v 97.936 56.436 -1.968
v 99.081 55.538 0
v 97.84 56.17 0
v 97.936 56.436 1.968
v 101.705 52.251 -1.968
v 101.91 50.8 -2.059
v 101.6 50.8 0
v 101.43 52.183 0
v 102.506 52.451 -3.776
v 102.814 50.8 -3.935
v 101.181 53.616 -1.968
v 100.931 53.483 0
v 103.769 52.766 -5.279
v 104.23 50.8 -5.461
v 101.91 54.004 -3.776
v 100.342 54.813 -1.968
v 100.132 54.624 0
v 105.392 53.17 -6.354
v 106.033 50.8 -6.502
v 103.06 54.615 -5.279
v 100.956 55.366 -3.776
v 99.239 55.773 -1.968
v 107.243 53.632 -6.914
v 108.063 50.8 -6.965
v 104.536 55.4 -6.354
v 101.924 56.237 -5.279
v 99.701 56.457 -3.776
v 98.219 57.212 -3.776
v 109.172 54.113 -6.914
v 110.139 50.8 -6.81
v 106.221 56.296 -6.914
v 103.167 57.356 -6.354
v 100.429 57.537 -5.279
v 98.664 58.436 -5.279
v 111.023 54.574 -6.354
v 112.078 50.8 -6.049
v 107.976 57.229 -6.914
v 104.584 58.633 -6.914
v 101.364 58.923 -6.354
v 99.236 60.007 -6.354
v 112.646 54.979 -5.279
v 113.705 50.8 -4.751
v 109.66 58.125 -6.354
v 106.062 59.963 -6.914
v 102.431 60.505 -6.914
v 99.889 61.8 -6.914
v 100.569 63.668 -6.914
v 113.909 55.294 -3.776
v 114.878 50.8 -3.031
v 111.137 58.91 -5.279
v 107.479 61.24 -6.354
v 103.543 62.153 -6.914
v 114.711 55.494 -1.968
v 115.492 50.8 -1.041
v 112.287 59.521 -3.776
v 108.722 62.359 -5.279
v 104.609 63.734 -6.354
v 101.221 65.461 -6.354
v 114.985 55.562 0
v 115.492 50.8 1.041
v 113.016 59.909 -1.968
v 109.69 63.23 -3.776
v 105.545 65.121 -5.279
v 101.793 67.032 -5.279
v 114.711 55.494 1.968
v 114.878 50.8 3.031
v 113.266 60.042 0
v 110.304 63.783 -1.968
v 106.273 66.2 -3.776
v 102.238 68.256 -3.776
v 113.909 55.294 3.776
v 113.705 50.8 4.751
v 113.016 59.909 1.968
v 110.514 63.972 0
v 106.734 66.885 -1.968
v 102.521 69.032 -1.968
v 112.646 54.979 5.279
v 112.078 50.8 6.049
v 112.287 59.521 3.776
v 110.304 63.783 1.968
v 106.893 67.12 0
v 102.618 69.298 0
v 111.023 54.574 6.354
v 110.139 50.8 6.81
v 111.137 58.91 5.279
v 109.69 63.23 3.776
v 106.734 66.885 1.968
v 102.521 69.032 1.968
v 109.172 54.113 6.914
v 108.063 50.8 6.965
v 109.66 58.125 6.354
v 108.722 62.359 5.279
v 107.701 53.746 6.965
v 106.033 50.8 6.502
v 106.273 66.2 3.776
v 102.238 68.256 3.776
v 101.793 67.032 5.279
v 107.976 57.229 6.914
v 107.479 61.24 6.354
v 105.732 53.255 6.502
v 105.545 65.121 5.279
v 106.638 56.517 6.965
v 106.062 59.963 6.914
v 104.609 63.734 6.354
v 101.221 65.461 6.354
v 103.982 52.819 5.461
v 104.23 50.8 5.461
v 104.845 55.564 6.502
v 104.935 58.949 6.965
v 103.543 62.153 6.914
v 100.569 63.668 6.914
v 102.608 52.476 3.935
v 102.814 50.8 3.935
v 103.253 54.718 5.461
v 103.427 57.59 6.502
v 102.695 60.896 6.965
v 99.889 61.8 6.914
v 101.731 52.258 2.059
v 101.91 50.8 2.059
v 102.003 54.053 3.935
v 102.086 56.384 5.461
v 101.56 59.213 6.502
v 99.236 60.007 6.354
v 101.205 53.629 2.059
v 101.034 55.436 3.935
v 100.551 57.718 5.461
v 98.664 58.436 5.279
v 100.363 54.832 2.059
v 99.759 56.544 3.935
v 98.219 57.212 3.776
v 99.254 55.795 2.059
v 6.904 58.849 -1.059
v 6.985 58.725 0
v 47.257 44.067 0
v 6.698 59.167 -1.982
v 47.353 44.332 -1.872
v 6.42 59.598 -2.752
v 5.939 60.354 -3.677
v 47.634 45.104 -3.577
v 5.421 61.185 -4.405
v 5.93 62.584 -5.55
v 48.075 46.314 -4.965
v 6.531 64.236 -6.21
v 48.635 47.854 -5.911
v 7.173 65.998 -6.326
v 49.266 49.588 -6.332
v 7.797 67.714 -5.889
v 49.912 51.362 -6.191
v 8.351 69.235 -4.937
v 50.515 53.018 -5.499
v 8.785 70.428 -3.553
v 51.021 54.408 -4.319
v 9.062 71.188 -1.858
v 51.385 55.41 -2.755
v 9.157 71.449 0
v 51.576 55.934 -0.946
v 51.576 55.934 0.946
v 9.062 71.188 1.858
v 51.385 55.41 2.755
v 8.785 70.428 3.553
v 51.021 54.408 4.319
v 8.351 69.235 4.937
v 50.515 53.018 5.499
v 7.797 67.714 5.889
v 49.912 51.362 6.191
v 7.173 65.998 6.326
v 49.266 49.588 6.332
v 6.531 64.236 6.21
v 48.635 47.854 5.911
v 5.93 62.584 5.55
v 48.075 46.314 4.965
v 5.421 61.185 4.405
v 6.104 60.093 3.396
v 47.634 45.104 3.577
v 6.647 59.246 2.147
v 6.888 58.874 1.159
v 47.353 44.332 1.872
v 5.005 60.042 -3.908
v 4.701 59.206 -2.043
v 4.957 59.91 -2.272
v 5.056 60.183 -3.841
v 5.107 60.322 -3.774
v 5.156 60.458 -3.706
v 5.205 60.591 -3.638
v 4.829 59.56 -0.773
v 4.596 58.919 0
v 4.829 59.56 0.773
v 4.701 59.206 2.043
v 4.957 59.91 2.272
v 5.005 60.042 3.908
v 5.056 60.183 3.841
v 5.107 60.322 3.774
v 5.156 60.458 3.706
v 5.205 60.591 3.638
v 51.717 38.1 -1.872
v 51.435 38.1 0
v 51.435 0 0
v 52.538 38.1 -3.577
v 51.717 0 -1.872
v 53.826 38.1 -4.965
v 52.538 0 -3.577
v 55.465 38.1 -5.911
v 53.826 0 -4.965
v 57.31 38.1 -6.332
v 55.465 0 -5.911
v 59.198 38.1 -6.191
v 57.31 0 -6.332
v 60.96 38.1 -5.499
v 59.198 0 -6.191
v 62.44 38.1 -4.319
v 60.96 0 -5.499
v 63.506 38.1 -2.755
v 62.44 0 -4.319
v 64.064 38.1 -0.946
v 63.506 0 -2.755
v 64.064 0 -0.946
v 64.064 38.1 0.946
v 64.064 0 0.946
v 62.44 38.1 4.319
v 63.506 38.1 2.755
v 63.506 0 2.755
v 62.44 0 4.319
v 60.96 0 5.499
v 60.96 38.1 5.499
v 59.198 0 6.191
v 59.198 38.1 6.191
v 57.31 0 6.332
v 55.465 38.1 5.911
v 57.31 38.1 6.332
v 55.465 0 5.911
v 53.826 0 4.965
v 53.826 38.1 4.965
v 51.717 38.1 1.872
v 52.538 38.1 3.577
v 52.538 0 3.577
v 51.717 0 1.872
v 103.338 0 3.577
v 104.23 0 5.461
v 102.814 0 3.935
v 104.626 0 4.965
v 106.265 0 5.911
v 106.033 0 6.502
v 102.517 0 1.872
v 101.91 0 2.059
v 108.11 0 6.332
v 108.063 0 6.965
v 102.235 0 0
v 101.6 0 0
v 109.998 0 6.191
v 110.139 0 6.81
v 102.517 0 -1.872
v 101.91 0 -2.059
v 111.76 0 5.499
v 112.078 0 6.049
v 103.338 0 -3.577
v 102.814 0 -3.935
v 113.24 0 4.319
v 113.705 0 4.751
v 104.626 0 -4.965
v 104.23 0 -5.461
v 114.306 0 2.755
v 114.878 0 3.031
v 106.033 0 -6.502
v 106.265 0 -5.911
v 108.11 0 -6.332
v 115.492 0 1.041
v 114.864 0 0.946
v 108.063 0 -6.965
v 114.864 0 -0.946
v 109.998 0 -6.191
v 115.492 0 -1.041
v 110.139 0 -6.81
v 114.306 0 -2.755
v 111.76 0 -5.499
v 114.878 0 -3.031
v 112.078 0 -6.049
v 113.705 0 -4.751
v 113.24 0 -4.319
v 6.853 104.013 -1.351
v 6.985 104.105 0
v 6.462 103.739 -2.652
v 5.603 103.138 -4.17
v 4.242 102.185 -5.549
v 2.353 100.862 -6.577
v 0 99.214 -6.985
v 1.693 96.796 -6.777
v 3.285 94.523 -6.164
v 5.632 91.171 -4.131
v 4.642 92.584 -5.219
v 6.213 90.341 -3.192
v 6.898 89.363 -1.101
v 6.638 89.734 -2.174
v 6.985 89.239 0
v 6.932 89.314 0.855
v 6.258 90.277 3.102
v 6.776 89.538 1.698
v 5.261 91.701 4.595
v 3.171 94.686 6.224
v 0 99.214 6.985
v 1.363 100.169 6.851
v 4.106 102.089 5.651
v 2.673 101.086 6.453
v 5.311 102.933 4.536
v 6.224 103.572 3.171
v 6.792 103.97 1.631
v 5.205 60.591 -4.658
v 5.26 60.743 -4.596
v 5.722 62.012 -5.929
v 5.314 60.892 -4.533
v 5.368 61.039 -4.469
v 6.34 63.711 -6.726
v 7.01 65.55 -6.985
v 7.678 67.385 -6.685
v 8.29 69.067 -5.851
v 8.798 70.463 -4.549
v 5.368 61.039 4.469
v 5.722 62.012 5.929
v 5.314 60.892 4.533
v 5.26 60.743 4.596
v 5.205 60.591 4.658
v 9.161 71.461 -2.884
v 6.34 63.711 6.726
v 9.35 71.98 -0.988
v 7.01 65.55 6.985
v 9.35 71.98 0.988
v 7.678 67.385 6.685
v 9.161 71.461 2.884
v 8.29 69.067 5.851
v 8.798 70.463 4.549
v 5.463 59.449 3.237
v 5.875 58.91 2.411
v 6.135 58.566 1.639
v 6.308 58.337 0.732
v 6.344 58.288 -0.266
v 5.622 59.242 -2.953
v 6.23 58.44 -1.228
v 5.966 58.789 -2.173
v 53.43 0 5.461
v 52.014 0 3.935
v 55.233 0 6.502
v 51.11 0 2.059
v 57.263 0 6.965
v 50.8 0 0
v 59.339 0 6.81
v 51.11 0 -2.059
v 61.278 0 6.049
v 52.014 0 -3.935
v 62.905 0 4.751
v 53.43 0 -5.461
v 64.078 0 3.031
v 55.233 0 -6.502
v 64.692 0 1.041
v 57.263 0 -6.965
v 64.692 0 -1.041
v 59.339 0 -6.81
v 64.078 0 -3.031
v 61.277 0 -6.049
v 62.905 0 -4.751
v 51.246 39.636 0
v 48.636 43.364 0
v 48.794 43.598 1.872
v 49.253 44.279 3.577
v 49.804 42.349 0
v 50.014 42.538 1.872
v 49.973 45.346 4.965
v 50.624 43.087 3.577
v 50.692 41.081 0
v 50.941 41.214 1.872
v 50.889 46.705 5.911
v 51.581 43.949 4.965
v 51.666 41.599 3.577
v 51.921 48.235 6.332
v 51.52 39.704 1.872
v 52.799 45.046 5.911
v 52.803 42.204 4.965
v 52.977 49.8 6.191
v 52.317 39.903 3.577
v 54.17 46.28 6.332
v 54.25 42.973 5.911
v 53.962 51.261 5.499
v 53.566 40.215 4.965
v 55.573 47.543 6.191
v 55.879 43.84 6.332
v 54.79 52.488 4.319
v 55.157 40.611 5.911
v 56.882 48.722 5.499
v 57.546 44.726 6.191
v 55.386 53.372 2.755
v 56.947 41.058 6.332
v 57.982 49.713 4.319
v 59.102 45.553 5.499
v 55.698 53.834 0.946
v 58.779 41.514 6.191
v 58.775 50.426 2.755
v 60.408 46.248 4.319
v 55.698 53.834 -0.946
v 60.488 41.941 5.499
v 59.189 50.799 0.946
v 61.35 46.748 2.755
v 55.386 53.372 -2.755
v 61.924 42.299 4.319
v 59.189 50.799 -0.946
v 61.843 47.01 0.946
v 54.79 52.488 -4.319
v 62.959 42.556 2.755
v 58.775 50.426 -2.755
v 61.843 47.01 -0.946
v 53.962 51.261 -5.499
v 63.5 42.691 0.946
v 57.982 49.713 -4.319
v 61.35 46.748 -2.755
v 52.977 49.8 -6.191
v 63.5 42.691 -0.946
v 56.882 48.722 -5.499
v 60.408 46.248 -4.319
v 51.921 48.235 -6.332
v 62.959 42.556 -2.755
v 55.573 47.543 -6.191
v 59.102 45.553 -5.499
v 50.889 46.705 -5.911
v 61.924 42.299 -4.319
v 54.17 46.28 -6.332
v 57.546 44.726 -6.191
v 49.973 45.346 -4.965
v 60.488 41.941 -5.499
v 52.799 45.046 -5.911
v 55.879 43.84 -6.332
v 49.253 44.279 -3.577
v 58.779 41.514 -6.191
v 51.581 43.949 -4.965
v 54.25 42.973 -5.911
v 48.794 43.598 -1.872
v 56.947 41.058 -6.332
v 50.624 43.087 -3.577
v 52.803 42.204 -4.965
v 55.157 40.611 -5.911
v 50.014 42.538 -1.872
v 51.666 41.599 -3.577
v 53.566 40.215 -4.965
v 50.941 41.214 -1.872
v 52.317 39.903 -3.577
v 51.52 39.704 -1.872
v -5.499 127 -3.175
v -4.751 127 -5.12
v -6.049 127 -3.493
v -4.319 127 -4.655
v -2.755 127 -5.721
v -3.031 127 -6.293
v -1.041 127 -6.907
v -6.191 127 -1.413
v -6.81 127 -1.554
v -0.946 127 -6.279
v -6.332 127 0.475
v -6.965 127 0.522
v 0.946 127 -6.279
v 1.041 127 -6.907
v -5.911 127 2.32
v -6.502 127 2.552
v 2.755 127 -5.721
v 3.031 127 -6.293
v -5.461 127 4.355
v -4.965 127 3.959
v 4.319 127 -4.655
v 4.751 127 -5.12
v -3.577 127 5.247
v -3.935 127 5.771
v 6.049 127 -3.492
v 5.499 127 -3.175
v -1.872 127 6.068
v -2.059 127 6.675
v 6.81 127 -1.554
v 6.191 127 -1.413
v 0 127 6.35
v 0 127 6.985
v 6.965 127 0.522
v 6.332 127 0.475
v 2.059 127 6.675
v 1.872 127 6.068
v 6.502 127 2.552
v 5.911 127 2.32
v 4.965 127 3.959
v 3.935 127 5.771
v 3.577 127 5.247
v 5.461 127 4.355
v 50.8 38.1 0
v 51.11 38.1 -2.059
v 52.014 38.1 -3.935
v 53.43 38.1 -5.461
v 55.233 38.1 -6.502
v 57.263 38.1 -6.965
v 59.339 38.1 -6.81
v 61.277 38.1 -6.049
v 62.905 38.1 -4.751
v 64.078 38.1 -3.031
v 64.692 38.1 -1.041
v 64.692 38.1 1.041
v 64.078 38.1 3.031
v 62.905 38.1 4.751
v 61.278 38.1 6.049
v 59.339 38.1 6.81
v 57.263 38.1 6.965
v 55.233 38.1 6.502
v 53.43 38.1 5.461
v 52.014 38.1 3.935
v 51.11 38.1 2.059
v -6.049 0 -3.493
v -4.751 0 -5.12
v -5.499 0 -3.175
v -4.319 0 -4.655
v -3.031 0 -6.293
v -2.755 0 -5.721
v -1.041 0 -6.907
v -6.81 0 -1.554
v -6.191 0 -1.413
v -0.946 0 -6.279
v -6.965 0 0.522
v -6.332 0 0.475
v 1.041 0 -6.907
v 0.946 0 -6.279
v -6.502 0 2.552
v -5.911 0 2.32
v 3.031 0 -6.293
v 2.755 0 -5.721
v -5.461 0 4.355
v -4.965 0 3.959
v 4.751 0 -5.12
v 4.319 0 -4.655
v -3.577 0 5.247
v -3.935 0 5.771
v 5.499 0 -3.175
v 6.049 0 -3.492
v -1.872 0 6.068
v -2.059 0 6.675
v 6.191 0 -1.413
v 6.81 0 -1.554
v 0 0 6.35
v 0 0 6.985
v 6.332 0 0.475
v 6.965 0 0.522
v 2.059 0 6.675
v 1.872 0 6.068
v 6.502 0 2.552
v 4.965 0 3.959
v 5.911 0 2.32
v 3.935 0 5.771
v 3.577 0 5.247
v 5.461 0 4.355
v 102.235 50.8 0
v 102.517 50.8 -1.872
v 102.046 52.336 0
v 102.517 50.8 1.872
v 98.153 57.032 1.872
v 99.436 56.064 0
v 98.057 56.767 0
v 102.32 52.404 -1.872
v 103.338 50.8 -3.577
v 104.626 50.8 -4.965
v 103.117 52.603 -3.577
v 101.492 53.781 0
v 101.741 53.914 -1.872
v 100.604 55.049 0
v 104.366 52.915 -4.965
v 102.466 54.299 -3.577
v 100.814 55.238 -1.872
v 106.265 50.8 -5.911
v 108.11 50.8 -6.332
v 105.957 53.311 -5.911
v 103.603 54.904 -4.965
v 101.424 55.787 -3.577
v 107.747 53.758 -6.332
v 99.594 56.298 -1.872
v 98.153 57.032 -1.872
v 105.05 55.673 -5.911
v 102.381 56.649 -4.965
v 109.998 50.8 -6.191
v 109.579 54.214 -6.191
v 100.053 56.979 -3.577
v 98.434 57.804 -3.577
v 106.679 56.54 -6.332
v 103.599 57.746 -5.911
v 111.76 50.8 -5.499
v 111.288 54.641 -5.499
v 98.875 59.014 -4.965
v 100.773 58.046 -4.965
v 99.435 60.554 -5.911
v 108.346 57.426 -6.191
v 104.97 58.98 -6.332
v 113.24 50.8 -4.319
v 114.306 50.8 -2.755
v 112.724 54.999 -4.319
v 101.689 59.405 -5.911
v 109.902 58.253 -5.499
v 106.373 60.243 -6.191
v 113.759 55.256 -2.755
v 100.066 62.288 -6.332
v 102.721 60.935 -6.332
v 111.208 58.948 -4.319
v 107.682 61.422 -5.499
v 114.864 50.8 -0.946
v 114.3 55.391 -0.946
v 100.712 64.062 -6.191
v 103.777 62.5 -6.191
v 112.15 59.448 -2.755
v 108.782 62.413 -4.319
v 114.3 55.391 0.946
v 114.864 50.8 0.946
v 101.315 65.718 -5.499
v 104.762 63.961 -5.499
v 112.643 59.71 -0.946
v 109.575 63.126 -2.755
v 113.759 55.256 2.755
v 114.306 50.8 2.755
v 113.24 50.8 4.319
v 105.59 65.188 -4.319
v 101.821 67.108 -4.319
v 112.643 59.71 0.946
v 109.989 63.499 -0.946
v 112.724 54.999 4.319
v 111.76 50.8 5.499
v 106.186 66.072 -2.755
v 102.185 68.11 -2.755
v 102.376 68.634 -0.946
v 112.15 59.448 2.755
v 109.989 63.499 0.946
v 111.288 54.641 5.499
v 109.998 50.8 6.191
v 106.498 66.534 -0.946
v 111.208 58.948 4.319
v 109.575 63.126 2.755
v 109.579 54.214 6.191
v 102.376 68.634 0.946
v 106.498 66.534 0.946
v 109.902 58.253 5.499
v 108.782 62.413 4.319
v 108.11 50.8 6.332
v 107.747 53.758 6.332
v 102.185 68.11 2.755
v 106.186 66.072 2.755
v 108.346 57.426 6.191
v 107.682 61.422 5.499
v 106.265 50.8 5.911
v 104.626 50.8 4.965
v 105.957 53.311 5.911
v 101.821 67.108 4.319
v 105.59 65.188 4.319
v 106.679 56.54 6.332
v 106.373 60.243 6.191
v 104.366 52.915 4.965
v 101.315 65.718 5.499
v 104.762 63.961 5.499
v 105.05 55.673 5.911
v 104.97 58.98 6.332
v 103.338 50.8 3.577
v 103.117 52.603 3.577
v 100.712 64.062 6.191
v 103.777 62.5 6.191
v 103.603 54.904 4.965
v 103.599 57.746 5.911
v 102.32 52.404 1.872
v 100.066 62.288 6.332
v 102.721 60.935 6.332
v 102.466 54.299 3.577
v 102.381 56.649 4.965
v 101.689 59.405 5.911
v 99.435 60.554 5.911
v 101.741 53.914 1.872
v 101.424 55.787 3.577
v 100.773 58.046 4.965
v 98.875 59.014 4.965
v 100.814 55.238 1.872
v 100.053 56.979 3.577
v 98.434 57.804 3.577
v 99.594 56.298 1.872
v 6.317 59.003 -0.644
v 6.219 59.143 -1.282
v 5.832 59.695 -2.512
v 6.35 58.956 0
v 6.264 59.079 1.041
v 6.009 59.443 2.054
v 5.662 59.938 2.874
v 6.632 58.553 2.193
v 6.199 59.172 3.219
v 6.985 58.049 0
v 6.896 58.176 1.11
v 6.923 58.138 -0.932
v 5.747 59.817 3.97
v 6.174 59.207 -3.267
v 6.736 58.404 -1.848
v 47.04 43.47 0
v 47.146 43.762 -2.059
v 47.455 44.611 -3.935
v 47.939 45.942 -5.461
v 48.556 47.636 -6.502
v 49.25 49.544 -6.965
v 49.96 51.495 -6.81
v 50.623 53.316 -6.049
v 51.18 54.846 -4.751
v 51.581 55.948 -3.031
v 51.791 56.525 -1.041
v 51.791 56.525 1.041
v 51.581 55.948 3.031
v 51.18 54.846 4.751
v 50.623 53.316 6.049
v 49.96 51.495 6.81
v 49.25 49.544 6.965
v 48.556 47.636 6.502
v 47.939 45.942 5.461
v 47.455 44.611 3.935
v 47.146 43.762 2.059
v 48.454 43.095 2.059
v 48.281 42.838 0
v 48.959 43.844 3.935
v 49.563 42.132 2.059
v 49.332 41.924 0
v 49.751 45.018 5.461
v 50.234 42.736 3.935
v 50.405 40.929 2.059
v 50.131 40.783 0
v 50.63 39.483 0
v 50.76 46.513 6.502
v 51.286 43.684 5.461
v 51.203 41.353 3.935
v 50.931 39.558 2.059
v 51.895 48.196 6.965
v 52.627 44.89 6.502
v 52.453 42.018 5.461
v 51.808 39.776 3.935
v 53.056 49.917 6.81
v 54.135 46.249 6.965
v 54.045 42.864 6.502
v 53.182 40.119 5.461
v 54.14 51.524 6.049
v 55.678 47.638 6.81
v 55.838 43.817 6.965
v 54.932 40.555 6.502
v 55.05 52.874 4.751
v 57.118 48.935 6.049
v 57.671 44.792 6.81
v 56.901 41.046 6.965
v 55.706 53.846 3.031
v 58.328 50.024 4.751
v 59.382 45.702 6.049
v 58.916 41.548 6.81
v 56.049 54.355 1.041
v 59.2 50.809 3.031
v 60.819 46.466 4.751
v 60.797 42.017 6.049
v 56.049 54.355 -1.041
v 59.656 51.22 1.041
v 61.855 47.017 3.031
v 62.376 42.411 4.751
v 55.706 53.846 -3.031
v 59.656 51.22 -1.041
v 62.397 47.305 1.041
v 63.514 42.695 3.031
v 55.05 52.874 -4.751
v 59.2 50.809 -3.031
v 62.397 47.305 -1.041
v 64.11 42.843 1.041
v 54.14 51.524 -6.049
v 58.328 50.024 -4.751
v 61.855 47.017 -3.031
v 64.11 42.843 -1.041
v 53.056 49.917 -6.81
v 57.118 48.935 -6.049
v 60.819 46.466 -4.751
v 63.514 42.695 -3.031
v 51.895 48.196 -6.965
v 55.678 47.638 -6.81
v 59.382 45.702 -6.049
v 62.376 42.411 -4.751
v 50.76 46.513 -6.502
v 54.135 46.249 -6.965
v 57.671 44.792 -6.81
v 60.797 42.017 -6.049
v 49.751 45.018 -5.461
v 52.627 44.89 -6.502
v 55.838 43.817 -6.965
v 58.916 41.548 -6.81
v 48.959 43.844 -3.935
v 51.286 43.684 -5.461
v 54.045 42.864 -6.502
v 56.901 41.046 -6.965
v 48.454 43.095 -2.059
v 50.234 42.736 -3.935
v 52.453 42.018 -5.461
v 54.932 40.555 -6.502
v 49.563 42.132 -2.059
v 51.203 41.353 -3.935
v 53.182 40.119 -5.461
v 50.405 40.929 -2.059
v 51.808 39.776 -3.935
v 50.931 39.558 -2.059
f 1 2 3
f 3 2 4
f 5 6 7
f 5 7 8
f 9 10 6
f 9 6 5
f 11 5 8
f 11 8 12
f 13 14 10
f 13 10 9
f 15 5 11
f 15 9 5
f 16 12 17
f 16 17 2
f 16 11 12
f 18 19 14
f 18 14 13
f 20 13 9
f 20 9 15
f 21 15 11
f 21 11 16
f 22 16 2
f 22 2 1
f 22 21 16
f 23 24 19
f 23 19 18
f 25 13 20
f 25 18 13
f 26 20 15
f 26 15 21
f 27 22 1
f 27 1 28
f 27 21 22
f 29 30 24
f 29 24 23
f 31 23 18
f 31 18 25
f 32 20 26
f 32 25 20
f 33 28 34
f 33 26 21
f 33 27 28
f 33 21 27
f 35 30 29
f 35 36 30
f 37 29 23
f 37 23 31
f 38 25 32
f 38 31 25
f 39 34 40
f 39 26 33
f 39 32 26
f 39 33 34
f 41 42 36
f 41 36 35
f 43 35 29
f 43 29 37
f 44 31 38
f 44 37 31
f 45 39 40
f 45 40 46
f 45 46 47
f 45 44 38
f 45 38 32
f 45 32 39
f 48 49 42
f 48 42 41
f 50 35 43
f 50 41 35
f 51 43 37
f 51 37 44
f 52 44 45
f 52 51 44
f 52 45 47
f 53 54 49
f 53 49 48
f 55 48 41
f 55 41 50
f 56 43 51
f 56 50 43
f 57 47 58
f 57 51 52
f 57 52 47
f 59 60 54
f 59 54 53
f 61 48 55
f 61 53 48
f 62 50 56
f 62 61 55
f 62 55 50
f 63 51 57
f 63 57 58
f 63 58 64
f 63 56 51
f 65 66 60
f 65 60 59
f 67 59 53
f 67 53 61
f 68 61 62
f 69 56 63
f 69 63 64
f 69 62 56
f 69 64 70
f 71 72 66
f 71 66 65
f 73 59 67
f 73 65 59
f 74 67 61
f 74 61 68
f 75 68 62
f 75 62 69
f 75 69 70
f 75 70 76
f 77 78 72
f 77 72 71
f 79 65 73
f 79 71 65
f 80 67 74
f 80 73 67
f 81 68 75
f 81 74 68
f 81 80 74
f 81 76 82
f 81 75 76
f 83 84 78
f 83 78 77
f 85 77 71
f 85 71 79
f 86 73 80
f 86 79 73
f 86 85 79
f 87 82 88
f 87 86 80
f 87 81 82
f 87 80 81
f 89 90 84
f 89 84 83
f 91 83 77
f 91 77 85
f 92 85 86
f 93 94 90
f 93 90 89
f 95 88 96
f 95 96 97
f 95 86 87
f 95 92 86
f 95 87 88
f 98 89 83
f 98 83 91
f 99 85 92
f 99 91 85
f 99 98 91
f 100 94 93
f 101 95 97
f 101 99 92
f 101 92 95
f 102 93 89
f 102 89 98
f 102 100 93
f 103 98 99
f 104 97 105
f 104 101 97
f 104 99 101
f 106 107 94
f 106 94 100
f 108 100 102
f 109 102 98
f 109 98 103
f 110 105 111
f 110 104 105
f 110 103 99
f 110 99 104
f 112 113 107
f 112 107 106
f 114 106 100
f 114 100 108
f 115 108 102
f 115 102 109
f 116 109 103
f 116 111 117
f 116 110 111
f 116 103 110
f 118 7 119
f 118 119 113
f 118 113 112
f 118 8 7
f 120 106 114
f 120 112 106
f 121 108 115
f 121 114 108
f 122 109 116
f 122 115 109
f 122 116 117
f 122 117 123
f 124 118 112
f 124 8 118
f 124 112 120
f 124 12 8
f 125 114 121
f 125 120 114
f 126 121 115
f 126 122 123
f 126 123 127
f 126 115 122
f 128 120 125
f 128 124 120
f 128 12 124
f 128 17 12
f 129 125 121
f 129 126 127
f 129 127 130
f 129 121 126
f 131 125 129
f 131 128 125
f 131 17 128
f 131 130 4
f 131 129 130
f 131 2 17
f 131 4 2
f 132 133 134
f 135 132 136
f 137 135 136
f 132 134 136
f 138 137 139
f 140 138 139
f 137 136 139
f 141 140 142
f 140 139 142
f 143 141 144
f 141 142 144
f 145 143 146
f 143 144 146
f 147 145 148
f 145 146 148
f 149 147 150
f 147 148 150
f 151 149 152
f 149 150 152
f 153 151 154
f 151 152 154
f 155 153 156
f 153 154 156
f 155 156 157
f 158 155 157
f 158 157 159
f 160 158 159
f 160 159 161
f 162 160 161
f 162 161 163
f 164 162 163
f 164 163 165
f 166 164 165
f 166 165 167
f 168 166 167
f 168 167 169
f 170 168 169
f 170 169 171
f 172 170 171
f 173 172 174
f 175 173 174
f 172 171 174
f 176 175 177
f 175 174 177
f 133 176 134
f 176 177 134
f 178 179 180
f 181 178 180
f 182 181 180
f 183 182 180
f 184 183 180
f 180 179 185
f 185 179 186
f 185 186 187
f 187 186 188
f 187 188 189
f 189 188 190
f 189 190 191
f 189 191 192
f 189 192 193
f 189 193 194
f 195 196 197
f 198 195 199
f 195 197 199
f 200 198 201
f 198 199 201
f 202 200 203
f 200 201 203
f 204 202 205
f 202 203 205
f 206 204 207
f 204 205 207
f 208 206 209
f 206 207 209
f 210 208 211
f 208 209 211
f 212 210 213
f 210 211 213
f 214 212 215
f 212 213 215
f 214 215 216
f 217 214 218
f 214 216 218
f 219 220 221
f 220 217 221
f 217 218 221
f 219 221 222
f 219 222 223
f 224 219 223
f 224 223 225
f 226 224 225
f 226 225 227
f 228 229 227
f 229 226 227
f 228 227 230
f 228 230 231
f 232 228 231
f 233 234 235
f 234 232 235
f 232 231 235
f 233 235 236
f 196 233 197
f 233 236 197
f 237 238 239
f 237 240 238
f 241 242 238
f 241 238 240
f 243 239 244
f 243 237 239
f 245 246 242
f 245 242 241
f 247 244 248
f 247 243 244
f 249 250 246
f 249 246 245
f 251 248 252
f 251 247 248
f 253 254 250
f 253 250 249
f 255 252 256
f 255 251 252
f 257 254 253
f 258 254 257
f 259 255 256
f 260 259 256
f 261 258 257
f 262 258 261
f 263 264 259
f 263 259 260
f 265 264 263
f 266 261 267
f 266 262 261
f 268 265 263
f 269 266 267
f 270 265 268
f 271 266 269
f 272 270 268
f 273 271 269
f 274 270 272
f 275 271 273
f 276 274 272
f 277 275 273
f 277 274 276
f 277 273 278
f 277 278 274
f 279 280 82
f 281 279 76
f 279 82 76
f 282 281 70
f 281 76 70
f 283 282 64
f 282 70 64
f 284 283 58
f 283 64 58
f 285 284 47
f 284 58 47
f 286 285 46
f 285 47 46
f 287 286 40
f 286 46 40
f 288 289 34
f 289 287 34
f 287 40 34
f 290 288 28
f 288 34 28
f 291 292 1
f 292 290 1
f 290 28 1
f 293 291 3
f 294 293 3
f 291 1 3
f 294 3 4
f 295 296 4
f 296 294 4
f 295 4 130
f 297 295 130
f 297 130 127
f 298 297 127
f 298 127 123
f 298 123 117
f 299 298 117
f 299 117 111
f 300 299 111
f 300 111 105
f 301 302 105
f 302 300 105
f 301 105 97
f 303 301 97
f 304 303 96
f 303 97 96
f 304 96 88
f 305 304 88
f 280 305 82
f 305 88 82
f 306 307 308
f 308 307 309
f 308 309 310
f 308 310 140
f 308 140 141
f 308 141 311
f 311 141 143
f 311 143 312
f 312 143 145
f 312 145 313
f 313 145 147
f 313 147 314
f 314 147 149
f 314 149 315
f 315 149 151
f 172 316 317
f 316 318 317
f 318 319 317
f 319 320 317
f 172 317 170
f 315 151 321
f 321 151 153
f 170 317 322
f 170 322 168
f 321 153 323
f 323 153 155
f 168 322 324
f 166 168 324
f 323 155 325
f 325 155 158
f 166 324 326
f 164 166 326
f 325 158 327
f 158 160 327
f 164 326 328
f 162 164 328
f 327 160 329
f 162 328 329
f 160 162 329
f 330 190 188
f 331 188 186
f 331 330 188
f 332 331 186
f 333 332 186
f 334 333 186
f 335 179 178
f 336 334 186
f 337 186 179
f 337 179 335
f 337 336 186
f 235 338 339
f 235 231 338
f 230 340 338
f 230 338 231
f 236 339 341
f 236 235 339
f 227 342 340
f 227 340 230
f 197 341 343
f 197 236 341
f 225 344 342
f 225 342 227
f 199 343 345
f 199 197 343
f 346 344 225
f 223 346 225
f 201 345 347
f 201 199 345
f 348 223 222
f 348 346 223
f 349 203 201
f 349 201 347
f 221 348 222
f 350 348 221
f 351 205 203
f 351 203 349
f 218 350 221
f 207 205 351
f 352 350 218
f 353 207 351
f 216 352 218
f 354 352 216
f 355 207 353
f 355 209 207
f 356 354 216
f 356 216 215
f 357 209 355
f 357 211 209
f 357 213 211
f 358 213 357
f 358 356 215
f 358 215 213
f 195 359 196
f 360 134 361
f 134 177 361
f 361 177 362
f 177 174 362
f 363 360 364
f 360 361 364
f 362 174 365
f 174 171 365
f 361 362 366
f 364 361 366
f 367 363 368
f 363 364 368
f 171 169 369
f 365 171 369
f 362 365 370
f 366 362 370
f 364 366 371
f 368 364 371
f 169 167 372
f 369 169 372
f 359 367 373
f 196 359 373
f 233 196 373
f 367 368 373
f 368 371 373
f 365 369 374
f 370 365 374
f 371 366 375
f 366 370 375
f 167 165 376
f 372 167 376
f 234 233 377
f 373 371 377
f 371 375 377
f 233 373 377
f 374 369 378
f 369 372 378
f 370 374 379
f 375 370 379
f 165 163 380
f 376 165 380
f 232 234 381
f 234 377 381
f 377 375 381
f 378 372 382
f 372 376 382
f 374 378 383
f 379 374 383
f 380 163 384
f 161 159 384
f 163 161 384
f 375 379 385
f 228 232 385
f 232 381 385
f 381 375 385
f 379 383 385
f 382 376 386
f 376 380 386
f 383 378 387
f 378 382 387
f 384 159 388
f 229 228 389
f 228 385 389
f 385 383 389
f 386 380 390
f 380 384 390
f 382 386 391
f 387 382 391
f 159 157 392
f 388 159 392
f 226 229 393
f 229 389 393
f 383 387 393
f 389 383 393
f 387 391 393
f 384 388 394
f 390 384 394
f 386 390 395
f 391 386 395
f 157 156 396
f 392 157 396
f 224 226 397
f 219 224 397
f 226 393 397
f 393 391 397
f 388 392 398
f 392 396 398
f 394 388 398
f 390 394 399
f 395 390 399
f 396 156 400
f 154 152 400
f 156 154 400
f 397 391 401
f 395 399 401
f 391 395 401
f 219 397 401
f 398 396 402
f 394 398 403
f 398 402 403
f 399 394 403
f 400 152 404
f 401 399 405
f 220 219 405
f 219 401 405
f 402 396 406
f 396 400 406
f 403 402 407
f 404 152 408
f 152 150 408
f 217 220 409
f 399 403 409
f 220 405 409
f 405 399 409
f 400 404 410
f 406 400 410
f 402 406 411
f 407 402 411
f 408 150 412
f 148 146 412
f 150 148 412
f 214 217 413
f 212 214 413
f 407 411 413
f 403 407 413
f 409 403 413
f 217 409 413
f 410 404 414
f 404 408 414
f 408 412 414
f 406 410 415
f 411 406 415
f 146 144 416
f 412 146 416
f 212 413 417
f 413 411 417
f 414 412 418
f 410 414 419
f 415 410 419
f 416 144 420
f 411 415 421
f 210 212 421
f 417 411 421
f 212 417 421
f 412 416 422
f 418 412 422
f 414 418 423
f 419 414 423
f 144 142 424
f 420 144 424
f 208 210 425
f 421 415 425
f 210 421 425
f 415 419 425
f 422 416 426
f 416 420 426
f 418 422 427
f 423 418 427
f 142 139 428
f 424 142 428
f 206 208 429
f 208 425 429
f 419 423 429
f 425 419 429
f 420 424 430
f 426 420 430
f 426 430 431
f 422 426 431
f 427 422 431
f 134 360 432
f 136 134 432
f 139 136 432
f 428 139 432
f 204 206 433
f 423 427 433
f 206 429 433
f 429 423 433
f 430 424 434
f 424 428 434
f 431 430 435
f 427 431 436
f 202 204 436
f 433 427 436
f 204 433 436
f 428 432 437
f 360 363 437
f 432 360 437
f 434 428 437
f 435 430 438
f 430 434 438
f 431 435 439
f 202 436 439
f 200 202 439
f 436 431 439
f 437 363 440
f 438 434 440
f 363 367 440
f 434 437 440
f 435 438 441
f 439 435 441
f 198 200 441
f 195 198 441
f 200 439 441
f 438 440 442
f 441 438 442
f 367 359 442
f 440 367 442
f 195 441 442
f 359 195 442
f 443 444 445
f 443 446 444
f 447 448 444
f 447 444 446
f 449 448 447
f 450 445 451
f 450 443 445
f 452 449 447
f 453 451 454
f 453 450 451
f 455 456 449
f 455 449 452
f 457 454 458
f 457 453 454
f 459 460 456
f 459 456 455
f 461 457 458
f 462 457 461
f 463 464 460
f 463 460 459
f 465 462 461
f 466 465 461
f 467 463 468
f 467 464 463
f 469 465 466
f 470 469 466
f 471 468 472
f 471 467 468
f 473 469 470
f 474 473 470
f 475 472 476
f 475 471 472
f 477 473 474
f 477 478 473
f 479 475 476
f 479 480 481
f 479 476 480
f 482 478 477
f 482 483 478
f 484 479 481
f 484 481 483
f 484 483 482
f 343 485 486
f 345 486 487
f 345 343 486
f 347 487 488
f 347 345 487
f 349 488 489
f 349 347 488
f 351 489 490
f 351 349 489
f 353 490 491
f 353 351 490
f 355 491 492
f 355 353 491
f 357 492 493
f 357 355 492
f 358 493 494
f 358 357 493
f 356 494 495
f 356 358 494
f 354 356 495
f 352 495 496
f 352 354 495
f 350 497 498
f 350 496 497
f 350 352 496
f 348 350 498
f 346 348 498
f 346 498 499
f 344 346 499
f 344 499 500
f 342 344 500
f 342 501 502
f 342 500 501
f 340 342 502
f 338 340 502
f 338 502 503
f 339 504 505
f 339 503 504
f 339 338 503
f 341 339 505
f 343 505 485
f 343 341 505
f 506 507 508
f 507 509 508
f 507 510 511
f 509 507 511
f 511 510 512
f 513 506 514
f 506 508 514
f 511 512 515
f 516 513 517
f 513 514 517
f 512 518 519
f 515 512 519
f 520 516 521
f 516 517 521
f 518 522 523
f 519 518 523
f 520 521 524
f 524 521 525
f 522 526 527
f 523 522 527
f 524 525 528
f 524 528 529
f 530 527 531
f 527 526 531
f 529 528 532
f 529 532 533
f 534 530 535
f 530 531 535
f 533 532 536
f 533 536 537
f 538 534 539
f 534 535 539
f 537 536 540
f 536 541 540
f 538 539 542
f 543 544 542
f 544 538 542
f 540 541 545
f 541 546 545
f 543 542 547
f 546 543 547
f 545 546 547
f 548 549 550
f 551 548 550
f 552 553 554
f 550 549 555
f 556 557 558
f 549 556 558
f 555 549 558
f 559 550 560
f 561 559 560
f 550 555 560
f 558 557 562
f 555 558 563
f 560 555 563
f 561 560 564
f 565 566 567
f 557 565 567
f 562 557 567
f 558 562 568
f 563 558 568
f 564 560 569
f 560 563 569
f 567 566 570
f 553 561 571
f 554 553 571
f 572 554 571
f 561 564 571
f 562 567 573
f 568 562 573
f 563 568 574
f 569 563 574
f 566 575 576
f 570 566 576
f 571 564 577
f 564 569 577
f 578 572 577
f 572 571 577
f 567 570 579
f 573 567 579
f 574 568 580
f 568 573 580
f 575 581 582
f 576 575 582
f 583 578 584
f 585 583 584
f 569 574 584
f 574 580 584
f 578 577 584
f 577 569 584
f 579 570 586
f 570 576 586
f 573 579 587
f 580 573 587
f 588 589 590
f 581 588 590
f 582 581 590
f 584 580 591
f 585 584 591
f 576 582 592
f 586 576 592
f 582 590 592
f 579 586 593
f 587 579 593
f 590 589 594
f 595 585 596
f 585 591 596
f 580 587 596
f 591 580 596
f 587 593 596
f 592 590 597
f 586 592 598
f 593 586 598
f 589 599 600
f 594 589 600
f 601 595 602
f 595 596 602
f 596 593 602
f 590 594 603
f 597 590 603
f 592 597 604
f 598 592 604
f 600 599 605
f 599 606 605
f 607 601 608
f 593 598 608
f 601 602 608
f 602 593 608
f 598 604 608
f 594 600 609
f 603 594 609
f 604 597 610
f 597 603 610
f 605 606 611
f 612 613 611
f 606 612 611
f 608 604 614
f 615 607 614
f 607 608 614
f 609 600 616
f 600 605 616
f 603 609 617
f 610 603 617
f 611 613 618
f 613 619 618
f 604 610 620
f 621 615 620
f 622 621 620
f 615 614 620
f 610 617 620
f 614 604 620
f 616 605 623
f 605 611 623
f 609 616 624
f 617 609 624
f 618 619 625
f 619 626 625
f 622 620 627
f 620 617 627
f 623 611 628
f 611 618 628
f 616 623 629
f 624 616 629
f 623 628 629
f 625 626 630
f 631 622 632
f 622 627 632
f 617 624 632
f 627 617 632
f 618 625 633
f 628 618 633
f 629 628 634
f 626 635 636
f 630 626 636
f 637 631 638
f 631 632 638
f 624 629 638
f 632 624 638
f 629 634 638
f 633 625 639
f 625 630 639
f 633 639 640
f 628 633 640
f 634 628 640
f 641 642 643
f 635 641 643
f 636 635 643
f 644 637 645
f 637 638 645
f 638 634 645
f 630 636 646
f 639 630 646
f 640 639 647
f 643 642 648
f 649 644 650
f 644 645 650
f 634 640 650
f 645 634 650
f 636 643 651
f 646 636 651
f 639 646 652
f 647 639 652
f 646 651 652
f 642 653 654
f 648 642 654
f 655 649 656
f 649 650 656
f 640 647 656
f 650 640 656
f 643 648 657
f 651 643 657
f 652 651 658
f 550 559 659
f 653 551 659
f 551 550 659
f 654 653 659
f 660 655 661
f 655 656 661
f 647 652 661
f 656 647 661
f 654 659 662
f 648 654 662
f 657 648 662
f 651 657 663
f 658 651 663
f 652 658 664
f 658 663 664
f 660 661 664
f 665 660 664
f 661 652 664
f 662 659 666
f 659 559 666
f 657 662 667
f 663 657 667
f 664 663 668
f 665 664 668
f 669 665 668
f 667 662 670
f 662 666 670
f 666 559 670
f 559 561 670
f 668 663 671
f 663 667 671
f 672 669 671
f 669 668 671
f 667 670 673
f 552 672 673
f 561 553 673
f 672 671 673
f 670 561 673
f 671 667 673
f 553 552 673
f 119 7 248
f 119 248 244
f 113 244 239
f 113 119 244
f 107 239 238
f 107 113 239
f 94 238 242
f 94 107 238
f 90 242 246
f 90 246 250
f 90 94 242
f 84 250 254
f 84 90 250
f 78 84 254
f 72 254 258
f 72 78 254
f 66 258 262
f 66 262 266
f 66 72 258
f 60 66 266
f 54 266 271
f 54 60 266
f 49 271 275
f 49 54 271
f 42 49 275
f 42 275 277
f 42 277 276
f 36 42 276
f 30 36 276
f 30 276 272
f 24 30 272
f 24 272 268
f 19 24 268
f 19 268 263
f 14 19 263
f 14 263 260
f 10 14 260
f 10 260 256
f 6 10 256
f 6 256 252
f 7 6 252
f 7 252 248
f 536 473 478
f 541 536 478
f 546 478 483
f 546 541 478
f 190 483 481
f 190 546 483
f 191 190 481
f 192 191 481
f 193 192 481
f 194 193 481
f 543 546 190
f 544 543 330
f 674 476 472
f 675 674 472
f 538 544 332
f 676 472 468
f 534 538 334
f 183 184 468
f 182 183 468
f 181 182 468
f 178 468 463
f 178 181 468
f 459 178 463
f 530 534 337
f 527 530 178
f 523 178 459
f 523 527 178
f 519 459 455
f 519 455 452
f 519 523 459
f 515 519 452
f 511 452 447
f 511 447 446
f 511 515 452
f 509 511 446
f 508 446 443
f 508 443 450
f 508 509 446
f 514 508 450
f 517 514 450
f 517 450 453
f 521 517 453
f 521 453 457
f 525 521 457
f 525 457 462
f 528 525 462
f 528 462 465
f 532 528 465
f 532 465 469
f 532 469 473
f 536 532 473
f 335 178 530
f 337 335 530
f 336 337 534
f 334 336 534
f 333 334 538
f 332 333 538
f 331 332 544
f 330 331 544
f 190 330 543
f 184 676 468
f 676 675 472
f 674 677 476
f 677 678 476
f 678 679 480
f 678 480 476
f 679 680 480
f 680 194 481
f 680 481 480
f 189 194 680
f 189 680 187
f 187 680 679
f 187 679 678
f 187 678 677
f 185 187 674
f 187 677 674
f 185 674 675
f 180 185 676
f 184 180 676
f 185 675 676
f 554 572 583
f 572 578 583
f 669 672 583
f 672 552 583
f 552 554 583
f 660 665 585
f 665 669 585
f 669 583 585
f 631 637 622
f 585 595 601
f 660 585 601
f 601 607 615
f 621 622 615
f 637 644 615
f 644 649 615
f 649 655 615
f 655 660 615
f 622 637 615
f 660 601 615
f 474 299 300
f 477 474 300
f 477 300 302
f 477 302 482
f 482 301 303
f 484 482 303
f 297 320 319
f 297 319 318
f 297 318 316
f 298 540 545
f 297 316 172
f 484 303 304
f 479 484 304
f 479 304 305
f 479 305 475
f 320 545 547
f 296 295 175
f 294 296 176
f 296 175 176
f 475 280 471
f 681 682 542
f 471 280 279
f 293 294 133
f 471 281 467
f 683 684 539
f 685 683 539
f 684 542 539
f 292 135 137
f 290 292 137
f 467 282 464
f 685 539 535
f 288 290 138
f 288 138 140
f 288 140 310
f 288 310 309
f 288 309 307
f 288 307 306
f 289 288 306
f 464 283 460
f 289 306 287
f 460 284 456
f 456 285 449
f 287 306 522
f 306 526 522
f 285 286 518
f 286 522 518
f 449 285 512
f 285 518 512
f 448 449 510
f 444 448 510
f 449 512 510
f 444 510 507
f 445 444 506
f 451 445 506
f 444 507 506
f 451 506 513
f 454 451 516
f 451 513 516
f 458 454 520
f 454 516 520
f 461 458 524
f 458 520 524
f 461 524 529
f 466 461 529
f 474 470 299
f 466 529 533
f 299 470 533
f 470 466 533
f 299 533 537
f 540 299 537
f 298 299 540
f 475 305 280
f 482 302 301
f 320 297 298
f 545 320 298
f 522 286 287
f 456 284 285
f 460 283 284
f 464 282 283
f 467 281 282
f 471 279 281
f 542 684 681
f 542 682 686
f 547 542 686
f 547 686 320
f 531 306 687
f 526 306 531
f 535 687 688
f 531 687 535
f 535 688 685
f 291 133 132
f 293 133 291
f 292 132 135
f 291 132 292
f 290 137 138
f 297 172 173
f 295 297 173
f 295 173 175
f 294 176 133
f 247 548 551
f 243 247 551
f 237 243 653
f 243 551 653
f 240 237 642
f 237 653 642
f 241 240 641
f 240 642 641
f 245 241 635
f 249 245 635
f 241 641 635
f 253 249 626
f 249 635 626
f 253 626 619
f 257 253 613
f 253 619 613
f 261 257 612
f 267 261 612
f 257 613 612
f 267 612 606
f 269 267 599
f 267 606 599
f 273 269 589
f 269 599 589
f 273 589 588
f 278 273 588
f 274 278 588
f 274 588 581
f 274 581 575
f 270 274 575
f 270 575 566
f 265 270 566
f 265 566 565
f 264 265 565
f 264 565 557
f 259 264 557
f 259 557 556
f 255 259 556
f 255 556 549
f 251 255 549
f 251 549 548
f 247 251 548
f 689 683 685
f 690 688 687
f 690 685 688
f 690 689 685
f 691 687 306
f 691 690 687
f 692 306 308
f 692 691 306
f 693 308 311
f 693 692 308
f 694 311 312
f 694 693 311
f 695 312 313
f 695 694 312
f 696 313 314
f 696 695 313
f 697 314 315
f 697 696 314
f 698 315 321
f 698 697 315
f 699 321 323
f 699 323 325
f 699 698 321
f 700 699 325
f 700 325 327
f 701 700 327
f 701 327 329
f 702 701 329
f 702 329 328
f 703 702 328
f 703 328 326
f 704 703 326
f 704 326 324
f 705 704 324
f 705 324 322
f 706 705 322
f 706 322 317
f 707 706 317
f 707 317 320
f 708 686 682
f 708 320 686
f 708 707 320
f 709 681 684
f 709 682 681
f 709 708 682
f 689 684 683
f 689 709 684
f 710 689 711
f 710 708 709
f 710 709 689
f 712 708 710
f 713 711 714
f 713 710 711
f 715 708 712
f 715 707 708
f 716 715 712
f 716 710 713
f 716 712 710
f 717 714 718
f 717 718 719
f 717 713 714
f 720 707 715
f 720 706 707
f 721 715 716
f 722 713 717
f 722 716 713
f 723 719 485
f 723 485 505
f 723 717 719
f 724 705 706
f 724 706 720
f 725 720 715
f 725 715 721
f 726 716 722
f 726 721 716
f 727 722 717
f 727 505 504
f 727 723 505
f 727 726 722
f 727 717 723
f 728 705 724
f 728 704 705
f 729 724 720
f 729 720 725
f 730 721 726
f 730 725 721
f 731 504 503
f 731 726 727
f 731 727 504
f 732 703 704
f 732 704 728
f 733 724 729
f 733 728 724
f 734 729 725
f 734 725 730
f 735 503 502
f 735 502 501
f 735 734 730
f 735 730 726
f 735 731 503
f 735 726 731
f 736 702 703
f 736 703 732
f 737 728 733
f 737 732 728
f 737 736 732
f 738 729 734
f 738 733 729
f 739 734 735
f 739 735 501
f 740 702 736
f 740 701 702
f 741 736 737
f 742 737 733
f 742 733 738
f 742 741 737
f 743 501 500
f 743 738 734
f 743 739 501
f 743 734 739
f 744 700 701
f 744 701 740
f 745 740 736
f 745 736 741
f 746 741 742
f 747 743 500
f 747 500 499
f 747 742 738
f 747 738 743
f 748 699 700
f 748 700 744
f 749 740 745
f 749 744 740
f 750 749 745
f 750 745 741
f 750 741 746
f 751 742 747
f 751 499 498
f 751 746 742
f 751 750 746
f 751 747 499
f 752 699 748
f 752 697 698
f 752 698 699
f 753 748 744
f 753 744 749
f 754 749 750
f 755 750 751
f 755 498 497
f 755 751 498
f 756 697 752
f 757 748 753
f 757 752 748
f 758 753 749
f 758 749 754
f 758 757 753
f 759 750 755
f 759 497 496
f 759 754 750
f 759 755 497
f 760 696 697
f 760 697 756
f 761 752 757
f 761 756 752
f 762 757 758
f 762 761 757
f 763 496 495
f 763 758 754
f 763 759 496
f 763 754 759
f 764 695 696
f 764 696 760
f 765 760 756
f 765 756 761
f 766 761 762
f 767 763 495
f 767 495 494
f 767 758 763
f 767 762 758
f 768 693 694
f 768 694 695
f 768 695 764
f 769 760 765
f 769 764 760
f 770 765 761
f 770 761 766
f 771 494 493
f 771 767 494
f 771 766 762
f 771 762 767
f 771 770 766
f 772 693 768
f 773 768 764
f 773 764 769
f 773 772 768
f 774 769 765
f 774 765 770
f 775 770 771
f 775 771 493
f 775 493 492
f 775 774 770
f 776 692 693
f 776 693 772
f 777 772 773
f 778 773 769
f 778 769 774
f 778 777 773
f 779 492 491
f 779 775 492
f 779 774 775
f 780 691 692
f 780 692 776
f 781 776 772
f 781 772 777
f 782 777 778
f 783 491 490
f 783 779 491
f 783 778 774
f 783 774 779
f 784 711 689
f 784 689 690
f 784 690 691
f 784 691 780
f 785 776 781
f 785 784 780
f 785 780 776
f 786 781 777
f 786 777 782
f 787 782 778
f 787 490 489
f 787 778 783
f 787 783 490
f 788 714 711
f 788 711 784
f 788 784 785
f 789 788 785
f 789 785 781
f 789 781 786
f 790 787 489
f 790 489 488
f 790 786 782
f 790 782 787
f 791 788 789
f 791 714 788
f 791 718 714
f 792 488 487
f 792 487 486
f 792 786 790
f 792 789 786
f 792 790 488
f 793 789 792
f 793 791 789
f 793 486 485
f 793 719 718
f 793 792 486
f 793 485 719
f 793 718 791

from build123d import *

# Parameters (mm, degrees)
SKETCH1_R                = 6.985
SKETCH1_R_2              = 6.35
BOSS_EXTRUDE1_DEPTH      = 127
SKETCH3_R                = 6.985
SKETCH3_R_2              = 6.35
BOSS_EXTRUDE3_REACH      = 171.672
BOSS_EXTRUDE3_END_RADIUS = 6.985
SKETCH6_R                = 6.985
SKETCH9_R                = 6.985
SKETCH9_R_2              = 6.35


with BuildPart() as part:
    # Sketch1 → Boss-Extrude1 (new body)
    with BuildSketch(Plane(origin=(0, 0, 0), x_dir=(1, 0, 0), z_dir=(0, 1, 0))):
        with Locations(Location((0, 0, 0), (0, 0, 270))):
            Circle(SKETCH1_R)
        with Locations(Location((0, 0, 0), (0, 0, 270))):
            Circle(SKETCH1_R_2, mode=Mode.SUBTRACT)
    extrude(amount=BOSS_EXTRUDE1_DEPTH)



with BuildPart() as body_2:
    # Sweep10: sweep along a path in Sketch2
    with BuildLine(Plane.XY) as sweep10_path:
        Line((108.585, 0), (108.585, 50.8))
        ThreePointArc((108.585, 50.8), (106.288230962, 58.084420742), (100.22865582, 62.734096284))
    # Sketch3 → Sweep10 (sweep)
    with BuildSketch(Plane(origin=(108.585, 0, 0), x_dir=(-1, 0, 0), z_dir=(0, -1, 0))):
        Circle(SKETCH3_R)
        Circle(SKETCH3_R_2, mode=Mode.SUBTRACT)
    sweep(path=sweep10_path.line)


with BuildPart() as part_1:
    add(part.part)

    add(body_2.part)  # Boss-Extrude3 merges body 2
    # Boss-Extrude3: up to this cylinder (the profile starts outside it)
    boss_extrude3_end = Plane(origin=(0, 62.734096, 0), z_dir=(0, -1, 0)) * Cylinder(BOSS_EXTRUDE3_END_RADIUS, 358.314, mode=Mode.PRIVATE)
    # Sketch6 → Boss-Extrude3 (add, up to the surface)
    with BuildSketch(Plane(origin=(68.341780428, -24.874373833, 0), x_dir=(0, 0, 1), z_dir=(-0.9396926207859093, 0.3420201433256665, 0)), mode=Mode.PRIVATE) as boss_extrude3_sk1:
        with Locations(Location((0, 93.230986579, 0), (0, 0, 90))):
            Circle(SKETCH6_R)
    boss_extrude3_tool1 = extrude(boss_extrude3_sk1.sketch, amount=BOSS_EXTRUDE3_REACH, mode=Mode.PRIVATE) - boss_extrude3_end
    add(boss_extrude3_tool1.solids().sort_by_distance((100.228656, 62.734096, 0))[0])

    # Sweep14: sweep along a path in Sketch8
    with BuildLine(Plane.XY) as sweep14_path:
        Line((6.985, 65.482323636), (49.42865582, 50.034096284))
        ThreePointArc((49.42865582, 50.034096284), (55.488230962, 45.384420742), (57.785, 38.1))
        Line((57.785, 38.1), (57.785, 0))
    # Sketch9 → Sweep14 (sweep)
    with BuildSketch(Plane(origin=(57.785, 0, 0), x_dir=(-1, 0, 0), z_dir=(0, -1, 0))):
        Circle(SKETCH9_R)
        Circle(SKETCH9_R_2, mode=Mode.SUBTRACT)
    sweep(path=sweep14_path.line)


solid = part_1.part
